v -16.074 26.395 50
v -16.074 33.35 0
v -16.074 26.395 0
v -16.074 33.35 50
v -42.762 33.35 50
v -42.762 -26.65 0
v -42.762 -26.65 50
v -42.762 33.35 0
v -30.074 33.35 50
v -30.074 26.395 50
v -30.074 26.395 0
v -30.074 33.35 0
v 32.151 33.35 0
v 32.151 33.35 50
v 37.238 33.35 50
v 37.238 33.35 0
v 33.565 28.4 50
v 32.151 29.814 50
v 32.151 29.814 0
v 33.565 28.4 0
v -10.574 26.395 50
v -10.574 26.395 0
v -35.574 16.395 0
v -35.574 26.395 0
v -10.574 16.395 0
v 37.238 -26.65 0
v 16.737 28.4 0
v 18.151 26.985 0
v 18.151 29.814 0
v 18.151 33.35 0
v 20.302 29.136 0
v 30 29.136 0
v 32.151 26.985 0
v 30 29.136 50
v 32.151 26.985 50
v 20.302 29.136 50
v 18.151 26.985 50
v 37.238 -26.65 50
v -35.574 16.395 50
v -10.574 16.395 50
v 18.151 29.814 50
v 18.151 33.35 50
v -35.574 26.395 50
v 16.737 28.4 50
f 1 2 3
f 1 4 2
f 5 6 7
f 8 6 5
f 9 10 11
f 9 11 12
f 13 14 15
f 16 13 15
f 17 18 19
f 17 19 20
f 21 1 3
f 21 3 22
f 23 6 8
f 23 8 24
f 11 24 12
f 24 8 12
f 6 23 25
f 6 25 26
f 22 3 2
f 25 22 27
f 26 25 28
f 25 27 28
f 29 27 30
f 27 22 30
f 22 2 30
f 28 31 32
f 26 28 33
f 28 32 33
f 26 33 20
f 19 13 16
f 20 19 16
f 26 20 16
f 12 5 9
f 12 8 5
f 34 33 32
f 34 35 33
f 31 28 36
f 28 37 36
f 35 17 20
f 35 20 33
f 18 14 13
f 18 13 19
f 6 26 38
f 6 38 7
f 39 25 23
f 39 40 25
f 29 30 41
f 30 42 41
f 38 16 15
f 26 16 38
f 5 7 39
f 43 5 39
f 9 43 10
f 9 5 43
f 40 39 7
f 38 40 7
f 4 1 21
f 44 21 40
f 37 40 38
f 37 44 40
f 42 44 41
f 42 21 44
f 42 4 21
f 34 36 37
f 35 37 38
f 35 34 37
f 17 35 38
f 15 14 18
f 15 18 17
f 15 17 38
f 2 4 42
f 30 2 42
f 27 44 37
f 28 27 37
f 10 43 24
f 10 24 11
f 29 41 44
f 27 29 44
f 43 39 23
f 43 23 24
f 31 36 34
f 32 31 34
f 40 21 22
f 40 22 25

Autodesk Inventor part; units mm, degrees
ref_plane "YZ Plane" through (0, 0, 0) normal (1, 0, 0) x (0, 1, 0)
ref_plane "XZ Plane" through (0, 0, 0) normal (0, 1, 0) x (-1, 0, 0)
ref_plane "XY Plane" through (0, 0, 0) normal (0, 0, 1) x (1, 0, 0)
sketch "Sketch1" plane through (0, 0, 0) normal (0, 0, 1) x (1, 0, 0)
  line L0 (-42.7621, 33.3504) -> (37.2379, 33.3504)
  line L1 (37.2379, 33.3504) -> (37.2379, -26.6496)
  line L2 (37.2379, -26.6496) -> (-42.7621, -26.6496)
  line L3 (-42.7621, -26.6496) -> (-42.7621, 33.3504)
  point P0 (0, 0)
  dimension "d0" = 80
  dimension "d1" = 60
extrude "Extrusion1" add sketch "Sketch1" along normal blind 50
sketch "Sketch2" plane through (0, 0, 50) normal (0, 0, 1) x (1, 0, 0)
  line L0 (-30.0743, 35.3951) -> (-16.0743, 35.3951)
  line L1 (-16.0743, 35.3951) -> (-16.0743, 26.3951)
  line L2 (-16.0743, 26.3951) -> (-10.5743, 26.3951)
  line L3 (-10.5743, 26.3951) -> (-10.5743, 16.3951)
  line L4 (-10.5743, 16.3951) -> (-35.5743, 16.3951)
  line L5 (-35.5743, 16.3951) -> (-35.5743, 26.3951)
  line L6 (-35.5743, 26.3951) -> (-30.0743, 26.3951)
  line L7 (-30.0743, 26.3951) -> (-30.0743, 35.3951)
  point P0 (0, 0)
  point P1 (-23.0743, 35.3951)
  dimension "d4" = 14
  dimension "d5" = 25
  dimension "d6" = 10
  dimension "d7" = 9
  dimension "d8" = 7
  dimension "d9" = 12.5
extrude "Extrusion2" cut sketch "Sketch2" against normal blind 50
sketch "Sketch3" plane through (0, 0, 50) normal (0, 0, 1) x (1, 0, 0)
  line L0 (25.1509, 34.1359) -> (32.1509, 34.1359)
  line L1 (32.1509, 34.1359) -> (32.1509, 29.8137)
  line L2 (32.1509, 29.8137) -> (33.5651, 28.3995)
  line L3 (33.5651, 28.3995) -> (32.1509, 26.9853)
  line L4 (32.1509, 26.9853) -> (30.0002, 29.1359)
  line L5 (30.0002, 29.1359) -> (25.1509, 29.1359)
  line L6 (25.1509, 34.1359) -> (25.1509, 29.1359) construction
  line L7 (25.1509, 34.1359) -> (18.1509, 34.1359)
  line L8 (18.1509, 34.1359) -> (18.1509, 29.8137)
  line L9 (18.1509, 29.8137) -> (16.7366, 28.3995)
  line L10 (16.7366, 28.3995) -> (18.1509, 26.9853)
  line L11 (18.1509, 26.9853) -> (20.3015, 29.1359)
  line L12 (20.3015, 29.1359) -> (25.1509, 29.1359)
  point P0 (0, 0)
  dimension "d12" = 7
  dimension "d13" = 5
  dimension "d14" = 2
  dimension "d15" = 2
  dimension "d16" = 135
  dimension "d17" = 4.3222
extrude "Extrusion3" cut sketch "Sketch3" against normal blind 50
properties part number "PiesaSuportCanale"
